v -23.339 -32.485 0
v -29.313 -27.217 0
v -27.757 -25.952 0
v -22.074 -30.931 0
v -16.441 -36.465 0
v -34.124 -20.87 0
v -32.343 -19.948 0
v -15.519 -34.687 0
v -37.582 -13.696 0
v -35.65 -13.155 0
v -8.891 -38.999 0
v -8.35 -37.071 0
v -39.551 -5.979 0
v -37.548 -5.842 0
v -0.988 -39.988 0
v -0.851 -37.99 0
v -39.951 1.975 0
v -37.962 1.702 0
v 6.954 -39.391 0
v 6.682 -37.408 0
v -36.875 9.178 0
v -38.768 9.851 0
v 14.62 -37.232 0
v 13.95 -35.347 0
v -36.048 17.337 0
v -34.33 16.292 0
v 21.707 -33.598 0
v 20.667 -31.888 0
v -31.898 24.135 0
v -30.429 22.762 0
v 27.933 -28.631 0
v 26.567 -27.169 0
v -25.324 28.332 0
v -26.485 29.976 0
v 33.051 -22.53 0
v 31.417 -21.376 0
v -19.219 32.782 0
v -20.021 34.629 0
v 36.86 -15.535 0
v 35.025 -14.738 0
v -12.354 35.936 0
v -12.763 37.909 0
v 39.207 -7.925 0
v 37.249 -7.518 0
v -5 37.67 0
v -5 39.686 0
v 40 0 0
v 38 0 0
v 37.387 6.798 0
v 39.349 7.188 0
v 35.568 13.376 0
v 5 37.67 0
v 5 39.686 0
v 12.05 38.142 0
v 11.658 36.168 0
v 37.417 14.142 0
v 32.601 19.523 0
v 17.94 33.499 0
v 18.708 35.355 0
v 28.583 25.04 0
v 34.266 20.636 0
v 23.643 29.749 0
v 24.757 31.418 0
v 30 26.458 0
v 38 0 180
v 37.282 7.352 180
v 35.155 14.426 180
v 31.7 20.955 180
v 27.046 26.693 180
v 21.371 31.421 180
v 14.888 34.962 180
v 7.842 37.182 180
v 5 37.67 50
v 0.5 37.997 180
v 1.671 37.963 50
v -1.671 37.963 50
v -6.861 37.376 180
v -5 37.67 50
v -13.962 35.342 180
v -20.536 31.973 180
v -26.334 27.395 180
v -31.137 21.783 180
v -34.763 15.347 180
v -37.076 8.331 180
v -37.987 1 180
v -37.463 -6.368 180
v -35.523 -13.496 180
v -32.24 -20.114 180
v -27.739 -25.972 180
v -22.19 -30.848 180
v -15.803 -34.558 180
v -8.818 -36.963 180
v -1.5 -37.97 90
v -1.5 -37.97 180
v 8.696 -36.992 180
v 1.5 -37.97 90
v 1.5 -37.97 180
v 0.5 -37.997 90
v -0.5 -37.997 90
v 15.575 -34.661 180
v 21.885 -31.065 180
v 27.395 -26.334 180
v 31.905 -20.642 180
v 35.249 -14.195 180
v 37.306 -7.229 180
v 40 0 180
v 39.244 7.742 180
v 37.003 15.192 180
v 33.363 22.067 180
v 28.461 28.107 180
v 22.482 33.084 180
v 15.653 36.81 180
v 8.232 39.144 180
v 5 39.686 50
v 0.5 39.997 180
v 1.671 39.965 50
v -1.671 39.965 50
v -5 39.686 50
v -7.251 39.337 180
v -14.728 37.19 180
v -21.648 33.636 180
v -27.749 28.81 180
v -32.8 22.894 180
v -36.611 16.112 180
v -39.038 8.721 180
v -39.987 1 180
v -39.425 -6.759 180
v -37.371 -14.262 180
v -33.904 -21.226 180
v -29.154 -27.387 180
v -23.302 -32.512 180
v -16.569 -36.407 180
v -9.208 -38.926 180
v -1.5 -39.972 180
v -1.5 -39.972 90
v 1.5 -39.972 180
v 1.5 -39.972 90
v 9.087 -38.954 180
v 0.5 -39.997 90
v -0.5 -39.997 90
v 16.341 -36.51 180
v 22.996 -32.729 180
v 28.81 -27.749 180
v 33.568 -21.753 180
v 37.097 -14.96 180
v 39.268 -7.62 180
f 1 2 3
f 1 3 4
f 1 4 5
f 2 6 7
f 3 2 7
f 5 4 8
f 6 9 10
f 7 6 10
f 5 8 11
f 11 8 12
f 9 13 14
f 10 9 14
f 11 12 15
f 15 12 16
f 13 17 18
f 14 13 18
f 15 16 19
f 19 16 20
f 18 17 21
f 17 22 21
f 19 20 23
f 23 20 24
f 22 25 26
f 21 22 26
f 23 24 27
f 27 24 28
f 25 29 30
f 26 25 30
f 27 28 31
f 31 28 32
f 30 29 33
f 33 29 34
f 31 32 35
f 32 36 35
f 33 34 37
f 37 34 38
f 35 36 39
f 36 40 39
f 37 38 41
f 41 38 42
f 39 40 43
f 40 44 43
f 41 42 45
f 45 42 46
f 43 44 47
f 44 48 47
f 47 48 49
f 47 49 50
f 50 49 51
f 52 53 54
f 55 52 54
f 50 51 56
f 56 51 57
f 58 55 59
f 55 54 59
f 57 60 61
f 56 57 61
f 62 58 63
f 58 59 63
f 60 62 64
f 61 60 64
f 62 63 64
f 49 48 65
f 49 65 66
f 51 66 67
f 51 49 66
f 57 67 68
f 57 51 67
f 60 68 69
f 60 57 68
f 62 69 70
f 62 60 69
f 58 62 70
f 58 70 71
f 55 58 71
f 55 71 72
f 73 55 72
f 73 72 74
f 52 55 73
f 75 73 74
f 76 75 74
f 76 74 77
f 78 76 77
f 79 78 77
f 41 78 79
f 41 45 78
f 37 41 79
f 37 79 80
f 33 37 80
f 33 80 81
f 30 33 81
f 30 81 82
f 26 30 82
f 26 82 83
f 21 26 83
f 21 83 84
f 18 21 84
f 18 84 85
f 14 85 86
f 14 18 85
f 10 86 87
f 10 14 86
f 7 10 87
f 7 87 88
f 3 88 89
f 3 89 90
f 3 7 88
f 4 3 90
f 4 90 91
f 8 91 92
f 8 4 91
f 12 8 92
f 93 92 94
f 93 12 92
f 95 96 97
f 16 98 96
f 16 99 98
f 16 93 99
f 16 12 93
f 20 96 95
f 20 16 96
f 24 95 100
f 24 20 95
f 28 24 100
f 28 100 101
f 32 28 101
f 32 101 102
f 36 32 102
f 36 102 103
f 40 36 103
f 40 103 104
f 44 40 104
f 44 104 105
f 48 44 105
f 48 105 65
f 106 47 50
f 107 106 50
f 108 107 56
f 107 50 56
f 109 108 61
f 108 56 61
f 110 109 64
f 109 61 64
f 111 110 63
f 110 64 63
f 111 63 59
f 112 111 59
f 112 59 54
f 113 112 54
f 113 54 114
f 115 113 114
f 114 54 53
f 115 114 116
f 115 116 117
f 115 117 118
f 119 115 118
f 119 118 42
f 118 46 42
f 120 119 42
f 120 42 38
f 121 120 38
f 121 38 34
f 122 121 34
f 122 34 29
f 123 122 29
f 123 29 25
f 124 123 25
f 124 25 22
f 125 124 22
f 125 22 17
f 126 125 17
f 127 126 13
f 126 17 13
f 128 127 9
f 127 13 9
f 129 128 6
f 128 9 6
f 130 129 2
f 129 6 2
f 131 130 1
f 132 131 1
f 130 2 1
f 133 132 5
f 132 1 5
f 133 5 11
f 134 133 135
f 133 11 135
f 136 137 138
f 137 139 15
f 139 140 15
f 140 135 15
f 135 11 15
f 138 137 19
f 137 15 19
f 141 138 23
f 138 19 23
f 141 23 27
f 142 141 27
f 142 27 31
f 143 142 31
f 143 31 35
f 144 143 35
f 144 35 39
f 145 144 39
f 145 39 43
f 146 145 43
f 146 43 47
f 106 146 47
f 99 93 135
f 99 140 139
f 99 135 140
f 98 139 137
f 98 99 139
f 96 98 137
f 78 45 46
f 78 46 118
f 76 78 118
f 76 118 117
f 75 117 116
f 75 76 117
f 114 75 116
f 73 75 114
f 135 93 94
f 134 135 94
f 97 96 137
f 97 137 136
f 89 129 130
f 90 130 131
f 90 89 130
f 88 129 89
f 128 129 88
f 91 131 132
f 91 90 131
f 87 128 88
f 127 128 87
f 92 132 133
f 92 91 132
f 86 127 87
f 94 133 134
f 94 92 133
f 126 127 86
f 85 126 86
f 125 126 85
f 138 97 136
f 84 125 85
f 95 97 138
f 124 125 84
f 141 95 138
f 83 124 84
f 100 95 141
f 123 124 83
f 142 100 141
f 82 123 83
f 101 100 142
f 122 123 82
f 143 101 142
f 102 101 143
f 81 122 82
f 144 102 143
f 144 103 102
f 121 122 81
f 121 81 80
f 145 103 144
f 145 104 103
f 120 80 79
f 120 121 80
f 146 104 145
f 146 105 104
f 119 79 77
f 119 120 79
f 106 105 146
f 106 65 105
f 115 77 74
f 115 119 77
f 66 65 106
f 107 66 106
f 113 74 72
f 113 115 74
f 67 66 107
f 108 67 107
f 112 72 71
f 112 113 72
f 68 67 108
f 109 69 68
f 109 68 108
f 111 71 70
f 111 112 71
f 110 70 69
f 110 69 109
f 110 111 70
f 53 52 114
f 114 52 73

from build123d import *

# Parameters (mm, degrees)
F0_R     = 40
F0_R_2   = 38
F1_DEPTH = 180
F2_W     = 3
F2_H     = 90
F3_DEPTH = 160
F4_W     = 10
F4_H     = 50
F5_DEPTH = 66.8


with BuildPart() as f1:
    # F0 (on Top) → F1 (new body)
    with BuildSketch(Plane.XY):
        Circle(F0_R)
        Circle(F0_R_2, mode=Mode.SUBTRACT)
    extrude(amount=F1_DEPTH)

    # F2 (on Front) → F3 (cut)
    with BuildSketch(Plane.XZ):
        with Locations((0, 135)):
            Rectangle(F2_W, F2_H)
    extrude(amount=F3_DEPTH, mode=Mode.SUBTRACT)

    # F4 (on Front) → F5 (cut)
    with BuildSketch(Plane.XZ):
        with Locations((0, 25)):
            Rectangle(F4_W, F4_H)
    extrude(amount=-F5_DEPTH, mode=Mode.SUBTRACT)


solid = f1.part
